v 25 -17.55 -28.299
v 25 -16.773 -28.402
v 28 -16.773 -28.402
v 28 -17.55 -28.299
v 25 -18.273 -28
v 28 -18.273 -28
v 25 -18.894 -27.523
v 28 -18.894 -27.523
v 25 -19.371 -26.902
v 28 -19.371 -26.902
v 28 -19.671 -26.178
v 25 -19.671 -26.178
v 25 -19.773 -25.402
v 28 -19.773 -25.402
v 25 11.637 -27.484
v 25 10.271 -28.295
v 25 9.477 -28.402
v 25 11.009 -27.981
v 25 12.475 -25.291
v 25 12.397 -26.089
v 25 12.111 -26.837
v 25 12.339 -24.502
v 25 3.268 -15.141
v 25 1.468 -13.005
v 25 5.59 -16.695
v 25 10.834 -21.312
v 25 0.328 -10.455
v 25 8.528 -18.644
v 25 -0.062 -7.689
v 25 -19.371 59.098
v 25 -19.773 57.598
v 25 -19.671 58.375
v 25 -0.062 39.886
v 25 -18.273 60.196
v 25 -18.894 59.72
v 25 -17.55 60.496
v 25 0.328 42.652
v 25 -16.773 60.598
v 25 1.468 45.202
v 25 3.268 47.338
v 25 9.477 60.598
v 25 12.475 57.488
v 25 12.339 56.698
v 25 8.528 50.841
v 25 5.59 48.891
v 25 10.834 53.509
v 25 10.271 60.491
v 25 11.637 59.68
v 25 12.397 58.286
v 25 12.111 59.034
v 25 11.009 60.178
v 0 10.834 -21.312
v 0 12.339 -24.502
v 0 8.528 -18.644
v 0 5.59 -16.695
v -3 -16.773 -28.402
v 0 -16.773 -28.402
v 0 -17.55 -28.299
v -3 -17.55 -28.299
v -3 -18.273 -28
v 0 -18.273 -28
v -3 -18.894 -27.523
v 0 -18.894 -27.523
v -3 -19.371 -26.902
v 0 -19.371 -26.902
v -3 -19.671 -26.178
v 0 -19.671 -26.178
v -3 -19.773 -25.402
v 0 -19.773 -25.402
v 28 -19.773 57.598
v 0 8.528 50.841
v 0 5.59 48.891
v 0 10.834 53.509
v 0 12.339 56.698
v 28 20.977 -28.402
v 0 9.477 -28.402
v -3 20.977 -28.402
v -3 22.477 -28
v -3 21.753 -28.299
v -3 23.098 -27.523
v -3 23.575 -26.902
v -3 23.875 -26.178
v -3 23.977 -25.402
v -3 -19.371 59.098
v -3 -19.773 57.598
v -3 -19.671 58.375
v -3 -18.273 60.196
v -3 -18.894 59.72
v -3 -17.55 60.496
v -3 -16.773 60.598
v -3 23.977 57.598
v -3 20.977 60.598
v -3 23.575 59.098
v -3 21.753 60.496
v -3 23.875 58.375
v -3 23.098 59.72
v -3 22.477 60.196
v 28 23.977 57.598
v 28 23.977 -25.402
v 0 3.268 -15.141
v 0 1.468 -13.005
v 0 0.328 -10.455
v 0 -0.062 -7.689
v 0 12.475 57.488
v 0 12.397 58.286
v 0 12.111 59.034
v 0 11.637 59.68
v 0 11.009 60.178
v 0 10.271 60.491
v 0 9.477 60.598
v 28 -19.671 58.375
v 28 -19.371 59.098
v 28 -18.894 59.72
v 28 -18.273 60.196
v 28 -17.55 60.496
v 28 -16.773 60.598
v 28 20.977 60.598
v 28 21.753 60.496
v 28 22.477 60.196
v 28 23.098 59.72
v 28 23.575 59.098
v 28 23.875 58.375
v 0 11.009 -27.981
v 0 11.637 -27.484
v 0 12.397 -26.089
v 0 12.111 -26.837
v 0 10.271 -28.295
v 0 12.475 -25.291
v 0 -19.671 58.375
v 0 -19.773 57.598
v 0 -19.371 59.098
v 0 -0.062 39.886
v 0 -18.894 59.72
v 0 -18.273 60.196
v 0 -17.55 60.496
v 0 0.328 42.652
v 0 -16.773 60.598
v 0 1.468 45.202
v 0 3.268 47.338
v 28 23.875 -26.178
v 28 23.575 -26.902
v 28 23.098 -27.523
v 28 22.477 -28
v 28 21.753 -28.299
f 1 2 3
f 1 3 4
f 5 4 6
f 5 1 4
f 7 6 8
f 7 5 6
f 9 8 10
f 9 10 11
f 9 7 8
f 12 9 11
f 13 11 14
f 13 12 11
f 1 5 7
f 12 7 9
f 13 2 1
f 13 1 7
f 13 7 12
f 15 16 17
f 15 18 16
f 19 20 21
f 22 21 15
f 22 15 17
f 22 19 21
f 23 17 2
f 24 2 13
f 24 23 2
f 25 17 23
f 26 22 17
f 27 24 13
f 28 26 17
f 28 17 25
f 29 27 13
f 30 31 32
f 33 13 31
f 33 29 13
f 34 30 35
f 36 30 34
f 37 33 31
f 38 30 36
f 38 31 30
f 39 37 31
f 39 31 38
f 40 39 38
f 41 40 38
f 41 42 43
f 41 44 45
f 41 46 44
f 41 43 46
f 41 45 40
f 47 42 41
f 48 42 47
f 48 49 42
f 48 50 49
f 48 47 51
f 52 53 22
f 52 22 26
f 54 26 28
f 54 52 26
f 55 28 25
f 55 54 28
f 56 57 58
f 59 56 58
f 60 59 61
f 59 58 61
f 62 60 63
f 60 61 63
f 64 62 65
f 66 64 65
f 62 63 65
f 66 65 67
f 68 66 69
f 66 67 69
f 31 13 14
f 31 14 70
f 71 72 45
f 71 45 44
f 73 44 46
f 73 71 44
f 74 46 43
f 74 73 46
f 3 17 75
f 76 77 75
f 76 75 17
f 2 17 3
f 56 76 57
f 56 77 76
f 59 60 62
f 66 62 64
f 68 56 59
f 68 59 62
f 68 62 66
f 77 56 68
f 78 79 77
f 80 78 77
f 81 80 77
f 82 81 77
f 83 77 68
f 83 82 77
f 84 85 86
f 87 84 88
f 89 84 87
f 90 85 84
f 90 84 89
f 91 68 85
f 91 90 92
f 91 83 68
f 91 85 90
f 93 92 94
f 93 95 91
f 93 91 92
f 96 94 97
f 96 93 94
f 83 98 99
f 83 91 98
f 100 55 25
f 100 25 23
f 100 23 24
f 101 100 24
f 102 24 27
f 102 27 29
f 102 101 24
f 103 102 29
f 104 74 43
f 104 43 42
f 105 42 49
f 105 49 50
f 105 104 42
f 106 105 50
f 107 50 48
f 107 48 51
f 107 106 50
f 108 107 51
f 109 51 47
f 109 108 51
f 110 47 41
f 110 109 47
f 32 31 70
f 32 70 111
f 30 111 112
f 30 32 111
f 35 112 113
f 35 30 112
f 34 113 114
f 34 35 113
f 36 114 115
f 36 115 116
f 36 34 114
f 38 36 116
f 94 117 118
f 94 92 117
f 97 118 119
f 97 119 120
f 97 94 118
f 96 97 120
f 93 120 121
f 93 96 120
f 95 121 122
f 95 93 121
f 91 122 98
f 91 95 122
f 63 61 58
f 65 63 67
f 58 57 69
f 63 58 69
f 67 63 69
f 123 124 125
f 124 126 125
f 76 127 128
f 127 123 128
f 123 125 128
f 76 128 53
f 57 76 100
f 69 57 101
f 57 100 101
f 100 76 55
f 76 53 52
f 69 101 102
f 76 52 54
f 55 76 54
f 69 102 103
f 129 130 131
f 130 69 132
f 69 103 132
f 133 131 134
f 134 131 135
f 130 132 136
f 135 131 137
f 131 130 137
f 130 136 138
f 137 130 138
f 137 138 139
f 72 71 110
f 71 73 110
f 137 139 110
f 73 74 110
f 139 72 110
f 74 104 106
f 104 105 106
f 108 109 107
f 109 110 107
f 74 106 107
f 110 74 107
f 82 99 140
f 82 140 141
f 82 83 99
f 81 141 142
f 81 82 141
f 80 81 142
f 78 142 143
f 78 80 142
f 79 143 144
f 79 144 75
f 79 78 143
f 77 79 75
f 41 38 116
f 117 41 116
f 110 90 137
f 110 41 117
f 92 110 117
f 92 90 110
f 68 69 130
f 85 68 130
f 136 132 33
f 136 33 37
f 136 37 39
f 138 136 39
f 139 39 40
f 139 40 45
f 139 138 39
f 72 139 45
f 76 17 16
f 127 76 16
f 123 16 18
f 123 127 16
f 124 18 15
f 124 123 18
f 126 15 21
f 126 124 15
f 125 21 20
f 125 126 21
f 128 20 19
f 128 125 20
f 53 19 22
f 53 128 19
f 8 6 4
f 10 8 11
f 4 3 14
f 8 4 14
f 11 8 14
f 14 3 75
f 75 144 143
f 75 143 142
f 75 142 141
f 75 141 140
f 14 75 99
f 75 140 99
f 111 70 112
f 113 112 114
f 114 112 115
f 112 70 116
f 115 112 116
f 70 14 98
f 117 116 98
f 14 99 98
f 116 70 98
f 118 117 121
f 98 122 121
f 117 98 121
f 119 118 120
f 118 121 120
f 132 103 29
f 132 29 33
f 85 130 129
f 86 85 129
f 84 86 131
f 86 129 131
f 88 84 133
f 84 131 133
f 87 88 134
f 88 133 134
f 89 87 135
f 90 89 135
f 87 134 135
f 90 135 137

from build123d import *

# Parameters (mm, degrees)
RESSALTO_EXTRUS_O2_DEPTH = 25
RESSALTO_EXTRUS_O3_DEPTH = 3
RESSALTO_EXTRUS_O4_DEPTH = 3


with BuildPart() as part:
    # Esboço2 → Ressalto-extrusão2 (new body)
    with BuildSketch(Plane(origin=(0, 0, 0), x_dir=(0, 0, -1), z_dir=(1, 0, 0))):
        with BuildLine():
            Line((2.90159992, -0.062465938), (-35.09840008, -0.062465938))
            Line((-35.09840008, -0.062465938), (-39.886084903, -0.062465938))
            ThreePointArc((-39.886084903, -0.062465938), (-45.202180234, 1.467638524), (-48.891439328, 5.589707975))
            ThreePointArc((-48.891439328, 5.589707975), (-52.096536948, 9.772081499), (-56.69840008, 12.338743681))
            ThreePointArc((-56.69840008, 12.338743681), (-59.373224015, 11.895603401), (-60.59840008, 9.476926077))
            Line((-60.59840008, 9.476926077), (-60.59840008, 20.976926077))
            ThreePointArc((-60.59840008, 20.976926077), (-59.719720424, 23.09824642), (-57.59840008, 23.976926077))
            Line((-57.59840008, 23.976926077), (25.40159992, 23.976926077))
            ThreePointArc((25.40159992, 23.976926077), (27.522920263, 23.09824642), (28.40159992, 20.976926077))
            Line((28.40159992, 20.976926077), (28.40159992, 9.476926077))
            ThreePointArc((28.40159992, 9.476926077), (27.176423855, 11.895603401), (24.50159992, 12.338743681))
            ThreePointArc((24.50159992, 12.338743681), (19.899736788, 9.772081499), (16.694639168, 5.589707975))
            ThreePointArc((16.694639168, 5.589707975), (13.005380073, 1.467638524), (7.689284743, -0.062465938))
            Line((7.689284743, -0.062465938), (2.90159992, -0.062465938))
        make_face()
    extrude(amount=RESSALTO_EXTRUS_O2_DEPTH)

    # Esboço3 → Ressalto-extrusão3 (add)
    with BuildSketch(Plane.ZY):
        with BuildLine():
            Line((60.59840008, 15.226926077), (60.59840008, 20.976926077))
            ThreePointArc((60.59840008, 20.976926077), (59.719720424, 23.09824642), (57.59840008, 23.976926077))
            Line((57.59840008, 23.976926077), (16.09840008, 23.976926077))
            Line((16.09840008, 23.976926077), (-25.40159992, 23.976926077))
            ThreePointArc((-25.40159992, 23.976926077), (-27.522920263, 23.09824642), (-28.40159992, 20.976926077))
            Line((-28.40159992, 20.976926077), (-28.40159992, 15.226926077))
            Line((-28.40159992, 15.226926077), (-28.40159992, -16.773073923))
            ThreePointArc((-28.40159992, -16.773073923), (-27.522920263, -18.894394267), (-25.40159992, -19.773073923))
            Line((-25.40159992, -19.773073923), (57.59840008, -19.773073923))
            ThreePointArc((57.59840008, -19.773073923), (59.719720424, -18.894394267), (60.59840008, -16.773073923))
            Line((60.59840008, -16.773073923), (60.59840008, 15.226926077))
        make_face()
    extrude(amount=RESSALTO_EXTRUS_O3_DEPTH)

    # Esboço4 → Ressalto-extrusão4 (add)
    with BuildSketch(Plane(origin=(25, 0, 0), x_dir=(0, 0, -1), z_dir=(1, 0, 0))):
        with BuildLine():
            Line((-16.09840008, 23.976926077), (25.40159992, 23.976926077))
            ThreePointArc((25.40159992, 23.976926077), (27.522920263, 23.09824642), (28.40159992, 20.976926077))
            Line((28.40159992, 20.976926077), (28.40159992, 15.226926077))
            Line((28.40159992, 15.226926077), (28.40159992, -16.773073923))
            ThreePointArc((28.40159992, -16.773073923), (27.522920263, -18.894394267), (25.40159992, -19.773073923))
            Line((25.40159992, -19.773073923), (-57.59840008, -19.773073923))
            ThreePointArc((-57.59840008, -19.773073923), (-59.719720424, -18.894394267), (-60.59840008, -16.773073923))
            Line((-60.59840008, -16.773073923), (-60.59840008, 15.226926077))
            Line((-60.59840008, 15.226926077), (-60.59840008, 20.976926077))
            ThreePointArc((-60.59840008, 20.976926077), (-59.719720424, 23.09824642), (-57.59840008, 23.976926077))
            Line((-57.59840008, 23.976926077), (-16.09840008, 23.976926077))
        make_face()
    extrude(amount=RESSALTO_EXTRUS_O4_DEPTH)


solid = part.part
